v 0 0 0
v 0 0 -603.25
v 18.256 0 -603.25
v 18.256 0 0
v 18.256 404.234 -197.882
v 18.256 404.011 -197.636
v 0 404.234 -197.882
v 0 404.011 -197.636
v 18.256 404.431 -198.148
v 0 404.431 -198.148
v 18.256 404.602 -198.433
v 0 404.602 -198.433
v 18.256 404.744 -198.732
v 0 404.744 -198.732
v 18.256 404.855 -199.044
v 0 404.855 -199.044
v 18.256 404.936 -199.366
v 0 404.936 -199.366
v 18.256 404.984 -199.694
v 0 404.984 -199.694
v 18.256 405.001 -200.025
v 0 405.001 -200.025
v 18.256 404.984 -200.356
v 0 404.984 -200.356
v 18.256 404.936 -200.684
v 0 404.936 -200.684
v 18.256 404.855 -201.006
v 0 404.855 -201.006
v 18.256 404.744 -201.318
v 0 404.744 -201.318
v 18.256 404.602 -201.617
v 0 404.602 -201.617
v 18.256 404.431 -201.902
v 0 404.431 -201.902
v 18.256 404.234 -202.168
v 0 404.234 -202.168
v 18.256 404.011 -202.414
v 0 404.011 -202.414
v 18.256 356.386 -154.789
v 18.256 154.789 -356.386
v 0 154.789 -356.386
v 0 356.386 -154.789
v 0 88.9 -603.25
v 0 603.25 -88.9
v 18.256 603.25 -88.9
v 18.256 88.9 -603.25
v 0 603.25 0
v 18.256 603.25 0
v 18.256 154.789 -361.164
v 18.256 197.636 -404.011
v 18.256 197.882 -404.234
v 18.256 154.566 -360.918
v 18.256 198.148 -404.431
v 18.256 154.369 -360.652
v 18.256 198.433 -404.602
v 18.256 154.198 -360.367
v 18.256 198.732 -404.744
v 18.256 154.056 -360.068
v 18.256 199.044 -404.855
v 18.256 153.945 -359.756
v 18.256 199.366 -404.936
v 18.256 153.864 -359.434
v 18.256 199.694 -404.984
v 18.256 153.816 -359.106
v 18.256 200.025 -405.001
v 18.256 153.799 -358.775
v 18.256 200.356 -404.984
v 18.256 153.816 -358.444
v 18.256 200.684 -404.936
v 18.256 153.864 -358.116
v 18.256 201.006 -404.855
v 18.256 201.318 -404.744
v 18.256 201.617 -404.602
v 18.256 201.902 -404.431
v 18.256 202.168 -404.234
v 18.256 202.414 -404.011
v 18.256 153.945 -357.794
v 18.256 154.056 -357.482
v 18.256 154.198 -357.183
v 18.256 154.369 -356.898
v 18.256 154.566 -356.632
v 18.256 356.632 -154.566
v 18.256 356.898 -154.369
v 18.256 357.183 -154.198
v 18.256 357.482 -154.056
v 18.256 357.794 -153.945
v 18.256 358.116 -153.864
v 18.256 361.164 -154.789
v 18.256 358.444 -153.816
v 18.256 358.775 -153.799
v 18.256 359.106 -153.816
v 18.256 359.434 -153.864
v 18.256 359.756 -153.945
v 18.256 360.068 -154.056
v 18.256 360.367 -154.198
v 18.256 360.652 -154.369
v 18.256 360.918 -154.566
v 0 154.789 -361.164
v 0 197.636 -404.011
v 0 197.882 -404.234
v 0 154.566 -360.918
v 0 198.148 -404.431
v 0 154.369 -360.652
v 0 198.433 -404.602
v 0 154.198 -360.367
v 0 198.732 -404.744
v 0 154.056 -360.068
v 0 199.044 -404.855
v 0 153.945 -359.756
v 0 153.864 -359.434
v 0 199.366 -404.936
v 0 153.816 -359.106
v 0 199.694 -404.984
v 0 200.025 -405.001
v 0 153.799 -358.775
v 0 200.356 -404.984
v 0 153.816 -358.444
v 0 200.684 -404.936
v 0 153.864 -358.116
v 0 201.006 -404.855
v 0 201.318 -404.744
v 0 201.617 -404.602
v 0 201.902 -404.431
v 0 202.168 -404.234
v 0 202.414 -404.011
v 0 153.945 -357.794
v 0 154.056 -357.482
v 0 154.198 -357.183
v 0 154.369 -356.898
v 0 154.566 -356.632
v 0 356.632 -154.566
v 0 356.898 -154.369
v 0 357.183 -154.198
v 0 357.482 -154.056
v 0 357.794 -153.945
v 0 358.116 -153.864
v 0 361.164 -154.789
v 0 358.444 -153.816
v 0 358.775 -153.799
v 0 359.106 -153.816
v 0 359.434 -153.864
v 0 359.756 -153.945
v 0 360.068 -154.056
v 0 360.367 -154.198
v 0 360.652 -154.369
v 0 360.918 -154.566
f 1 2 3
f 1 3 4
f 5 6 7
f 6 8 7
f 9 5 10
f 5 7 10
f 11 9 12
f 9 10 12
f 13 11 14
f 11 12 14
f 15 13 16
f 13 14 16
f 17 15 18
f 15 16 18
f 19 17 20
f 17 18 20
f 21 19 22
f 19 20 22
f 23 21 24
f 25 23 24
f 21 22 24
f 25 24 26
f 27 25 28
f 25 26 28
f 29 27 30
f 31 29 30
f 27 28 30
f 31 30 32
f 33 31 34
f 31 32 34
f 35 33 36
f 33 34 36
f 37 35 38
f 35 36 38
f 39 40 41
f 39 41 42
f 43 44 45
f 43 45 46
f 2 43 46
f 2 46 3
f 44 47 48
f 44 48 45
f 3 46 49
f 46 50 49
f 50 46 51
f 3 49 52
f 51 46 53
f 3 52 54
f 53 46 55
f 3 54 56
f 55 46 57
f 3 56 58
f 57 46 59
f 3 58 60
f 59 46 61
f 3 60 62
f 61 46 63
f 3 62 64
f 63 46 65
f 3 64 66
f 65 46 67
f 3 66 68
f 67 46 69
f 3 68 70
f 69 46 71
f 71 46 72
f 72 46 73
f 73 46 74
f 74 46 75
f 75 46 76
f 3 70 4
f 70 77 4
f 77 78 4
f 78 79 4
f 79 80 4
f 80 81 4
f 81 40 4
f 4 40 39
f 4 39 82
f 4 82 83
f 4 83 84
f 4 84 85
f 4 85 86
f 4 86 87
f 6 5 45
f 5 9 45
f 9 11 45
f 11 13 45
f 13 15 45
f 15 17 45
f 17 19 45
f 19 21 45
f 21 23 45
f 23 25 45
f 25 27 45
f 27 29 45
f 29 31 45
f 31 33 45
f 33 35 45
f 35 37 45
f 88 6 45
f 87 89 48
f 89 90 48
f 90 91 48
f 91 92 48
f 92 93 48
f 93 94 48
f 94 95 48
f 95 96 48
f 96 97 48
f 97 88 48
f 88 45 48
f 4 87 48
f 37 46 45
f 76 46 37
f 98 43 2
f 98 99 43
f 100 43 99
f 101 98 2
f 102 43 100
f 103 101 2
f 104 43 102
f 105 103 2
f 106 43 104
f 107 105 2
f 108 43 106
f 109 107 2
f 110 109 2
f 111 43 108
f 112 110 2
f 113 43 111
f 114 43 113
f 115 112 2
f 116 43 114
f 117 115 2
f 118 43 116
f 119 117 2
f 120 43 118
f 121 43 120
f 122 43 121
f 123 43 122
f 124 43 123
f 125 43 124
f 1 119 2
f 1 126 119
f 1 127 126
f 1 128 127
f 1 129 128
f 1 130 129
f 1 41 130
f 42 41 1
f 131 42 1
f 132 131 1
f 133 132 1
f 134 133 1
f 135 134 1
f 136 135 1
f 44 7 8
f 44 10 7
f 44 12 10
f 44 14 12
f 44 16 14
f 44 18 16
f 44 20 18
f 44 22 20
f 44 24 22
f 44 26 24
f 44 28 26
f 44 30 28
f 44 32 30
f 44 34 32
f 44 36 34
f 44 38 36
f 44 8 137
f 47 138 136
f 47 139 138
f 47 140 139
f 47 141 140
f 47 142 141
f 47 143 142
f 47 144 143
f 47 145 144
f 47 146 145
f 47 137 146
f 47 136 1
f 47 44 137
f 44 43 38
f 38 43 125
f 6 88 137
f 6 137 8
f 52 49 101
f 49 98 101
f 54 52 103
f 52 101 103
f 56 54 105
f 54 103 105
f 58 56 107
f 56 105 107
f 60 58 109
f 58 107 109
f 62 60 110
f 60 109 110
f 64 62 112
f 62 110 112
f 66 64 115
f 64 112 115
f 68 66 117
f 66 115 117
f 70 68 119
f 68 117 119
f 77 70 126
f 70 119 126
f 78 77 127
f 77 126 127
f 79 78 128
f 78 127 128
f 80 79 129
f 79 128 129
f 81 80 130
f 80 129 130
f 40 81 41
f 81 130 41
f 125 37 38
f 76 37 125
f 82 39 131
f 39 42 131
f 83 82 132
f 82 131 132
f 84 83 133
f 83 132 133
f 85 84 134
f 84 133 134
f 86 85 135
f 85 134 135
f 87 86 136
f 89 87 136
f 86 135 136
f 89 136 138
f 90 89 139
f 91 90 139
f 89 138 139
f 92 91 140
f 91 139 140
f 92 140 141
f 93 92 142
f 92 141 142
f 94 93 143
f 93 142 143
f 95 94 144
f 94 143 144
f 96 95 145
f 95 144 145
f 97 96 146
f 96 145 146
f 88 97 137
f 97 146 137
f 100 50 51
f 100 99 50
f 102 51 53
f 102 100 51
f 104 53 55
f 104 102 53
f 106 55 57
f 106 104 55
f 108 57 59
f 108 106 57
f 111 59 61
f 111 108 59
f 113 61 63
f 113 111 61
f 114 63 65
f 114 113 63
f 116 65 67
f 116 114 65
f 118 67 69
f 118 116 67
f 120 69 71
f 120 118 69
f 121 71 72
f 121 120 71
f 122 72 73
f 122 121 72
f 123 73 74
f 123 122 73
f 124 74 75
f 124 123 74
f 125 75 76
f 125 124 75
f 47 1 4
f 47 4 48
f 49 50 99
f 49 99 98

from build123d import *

# Parameters (mm, degrees)
BOSS_EXTRUDE1_DEPTH = 18.25625
CUT_EXTRUDE2_DEPTH  = 854.319644485
FILLET2_R           = 3.3782


with BuildPart() as part:
    # Sketch1 → Boss-Extrude1 (new body)
    with BuildSketch(Plane(origin=(0, 0, 0), x_dir=(0, 0, -1), z_dir=(1, 0, 0))):
        Polygon((0, 0), (0, 603.25), (88.9, 603.25), (603.25, 88.9), (603.25, 0), align=None)
    extrude(amount=BOSS_EXTRUDE1_DEPTH)

    # Sketch7 → Cut-Extrude2 (cut, through all)
    with BuildSketch(Plane(origin=(18.25625, 0, 0), x_dir=(0, 0, -1), z_dir=(1, 0, 0))):
        Polygon((200.025, 406.4), (406.4, 200.025), (358.775, 152.4), (152.4, 358.775), align=None)
    extrude(amount=-CUT_EXTRUDE2_DEPTH, mode=Mode.SUBTRACT)

    # Fillet2
    fillet2_edges = [part.edges().sort_by_distance(p)[0] for p in [
        (9.128125, 358.775, -152.4),
        (9.128125, 406.4, -200.025),
        (9.128125, 200.025, -406.4),
        (9.128125, 152.4, -358.775),
    ]]
    fillet(fillet2_edges, radius=FILLET2_R)


solid = part.part
